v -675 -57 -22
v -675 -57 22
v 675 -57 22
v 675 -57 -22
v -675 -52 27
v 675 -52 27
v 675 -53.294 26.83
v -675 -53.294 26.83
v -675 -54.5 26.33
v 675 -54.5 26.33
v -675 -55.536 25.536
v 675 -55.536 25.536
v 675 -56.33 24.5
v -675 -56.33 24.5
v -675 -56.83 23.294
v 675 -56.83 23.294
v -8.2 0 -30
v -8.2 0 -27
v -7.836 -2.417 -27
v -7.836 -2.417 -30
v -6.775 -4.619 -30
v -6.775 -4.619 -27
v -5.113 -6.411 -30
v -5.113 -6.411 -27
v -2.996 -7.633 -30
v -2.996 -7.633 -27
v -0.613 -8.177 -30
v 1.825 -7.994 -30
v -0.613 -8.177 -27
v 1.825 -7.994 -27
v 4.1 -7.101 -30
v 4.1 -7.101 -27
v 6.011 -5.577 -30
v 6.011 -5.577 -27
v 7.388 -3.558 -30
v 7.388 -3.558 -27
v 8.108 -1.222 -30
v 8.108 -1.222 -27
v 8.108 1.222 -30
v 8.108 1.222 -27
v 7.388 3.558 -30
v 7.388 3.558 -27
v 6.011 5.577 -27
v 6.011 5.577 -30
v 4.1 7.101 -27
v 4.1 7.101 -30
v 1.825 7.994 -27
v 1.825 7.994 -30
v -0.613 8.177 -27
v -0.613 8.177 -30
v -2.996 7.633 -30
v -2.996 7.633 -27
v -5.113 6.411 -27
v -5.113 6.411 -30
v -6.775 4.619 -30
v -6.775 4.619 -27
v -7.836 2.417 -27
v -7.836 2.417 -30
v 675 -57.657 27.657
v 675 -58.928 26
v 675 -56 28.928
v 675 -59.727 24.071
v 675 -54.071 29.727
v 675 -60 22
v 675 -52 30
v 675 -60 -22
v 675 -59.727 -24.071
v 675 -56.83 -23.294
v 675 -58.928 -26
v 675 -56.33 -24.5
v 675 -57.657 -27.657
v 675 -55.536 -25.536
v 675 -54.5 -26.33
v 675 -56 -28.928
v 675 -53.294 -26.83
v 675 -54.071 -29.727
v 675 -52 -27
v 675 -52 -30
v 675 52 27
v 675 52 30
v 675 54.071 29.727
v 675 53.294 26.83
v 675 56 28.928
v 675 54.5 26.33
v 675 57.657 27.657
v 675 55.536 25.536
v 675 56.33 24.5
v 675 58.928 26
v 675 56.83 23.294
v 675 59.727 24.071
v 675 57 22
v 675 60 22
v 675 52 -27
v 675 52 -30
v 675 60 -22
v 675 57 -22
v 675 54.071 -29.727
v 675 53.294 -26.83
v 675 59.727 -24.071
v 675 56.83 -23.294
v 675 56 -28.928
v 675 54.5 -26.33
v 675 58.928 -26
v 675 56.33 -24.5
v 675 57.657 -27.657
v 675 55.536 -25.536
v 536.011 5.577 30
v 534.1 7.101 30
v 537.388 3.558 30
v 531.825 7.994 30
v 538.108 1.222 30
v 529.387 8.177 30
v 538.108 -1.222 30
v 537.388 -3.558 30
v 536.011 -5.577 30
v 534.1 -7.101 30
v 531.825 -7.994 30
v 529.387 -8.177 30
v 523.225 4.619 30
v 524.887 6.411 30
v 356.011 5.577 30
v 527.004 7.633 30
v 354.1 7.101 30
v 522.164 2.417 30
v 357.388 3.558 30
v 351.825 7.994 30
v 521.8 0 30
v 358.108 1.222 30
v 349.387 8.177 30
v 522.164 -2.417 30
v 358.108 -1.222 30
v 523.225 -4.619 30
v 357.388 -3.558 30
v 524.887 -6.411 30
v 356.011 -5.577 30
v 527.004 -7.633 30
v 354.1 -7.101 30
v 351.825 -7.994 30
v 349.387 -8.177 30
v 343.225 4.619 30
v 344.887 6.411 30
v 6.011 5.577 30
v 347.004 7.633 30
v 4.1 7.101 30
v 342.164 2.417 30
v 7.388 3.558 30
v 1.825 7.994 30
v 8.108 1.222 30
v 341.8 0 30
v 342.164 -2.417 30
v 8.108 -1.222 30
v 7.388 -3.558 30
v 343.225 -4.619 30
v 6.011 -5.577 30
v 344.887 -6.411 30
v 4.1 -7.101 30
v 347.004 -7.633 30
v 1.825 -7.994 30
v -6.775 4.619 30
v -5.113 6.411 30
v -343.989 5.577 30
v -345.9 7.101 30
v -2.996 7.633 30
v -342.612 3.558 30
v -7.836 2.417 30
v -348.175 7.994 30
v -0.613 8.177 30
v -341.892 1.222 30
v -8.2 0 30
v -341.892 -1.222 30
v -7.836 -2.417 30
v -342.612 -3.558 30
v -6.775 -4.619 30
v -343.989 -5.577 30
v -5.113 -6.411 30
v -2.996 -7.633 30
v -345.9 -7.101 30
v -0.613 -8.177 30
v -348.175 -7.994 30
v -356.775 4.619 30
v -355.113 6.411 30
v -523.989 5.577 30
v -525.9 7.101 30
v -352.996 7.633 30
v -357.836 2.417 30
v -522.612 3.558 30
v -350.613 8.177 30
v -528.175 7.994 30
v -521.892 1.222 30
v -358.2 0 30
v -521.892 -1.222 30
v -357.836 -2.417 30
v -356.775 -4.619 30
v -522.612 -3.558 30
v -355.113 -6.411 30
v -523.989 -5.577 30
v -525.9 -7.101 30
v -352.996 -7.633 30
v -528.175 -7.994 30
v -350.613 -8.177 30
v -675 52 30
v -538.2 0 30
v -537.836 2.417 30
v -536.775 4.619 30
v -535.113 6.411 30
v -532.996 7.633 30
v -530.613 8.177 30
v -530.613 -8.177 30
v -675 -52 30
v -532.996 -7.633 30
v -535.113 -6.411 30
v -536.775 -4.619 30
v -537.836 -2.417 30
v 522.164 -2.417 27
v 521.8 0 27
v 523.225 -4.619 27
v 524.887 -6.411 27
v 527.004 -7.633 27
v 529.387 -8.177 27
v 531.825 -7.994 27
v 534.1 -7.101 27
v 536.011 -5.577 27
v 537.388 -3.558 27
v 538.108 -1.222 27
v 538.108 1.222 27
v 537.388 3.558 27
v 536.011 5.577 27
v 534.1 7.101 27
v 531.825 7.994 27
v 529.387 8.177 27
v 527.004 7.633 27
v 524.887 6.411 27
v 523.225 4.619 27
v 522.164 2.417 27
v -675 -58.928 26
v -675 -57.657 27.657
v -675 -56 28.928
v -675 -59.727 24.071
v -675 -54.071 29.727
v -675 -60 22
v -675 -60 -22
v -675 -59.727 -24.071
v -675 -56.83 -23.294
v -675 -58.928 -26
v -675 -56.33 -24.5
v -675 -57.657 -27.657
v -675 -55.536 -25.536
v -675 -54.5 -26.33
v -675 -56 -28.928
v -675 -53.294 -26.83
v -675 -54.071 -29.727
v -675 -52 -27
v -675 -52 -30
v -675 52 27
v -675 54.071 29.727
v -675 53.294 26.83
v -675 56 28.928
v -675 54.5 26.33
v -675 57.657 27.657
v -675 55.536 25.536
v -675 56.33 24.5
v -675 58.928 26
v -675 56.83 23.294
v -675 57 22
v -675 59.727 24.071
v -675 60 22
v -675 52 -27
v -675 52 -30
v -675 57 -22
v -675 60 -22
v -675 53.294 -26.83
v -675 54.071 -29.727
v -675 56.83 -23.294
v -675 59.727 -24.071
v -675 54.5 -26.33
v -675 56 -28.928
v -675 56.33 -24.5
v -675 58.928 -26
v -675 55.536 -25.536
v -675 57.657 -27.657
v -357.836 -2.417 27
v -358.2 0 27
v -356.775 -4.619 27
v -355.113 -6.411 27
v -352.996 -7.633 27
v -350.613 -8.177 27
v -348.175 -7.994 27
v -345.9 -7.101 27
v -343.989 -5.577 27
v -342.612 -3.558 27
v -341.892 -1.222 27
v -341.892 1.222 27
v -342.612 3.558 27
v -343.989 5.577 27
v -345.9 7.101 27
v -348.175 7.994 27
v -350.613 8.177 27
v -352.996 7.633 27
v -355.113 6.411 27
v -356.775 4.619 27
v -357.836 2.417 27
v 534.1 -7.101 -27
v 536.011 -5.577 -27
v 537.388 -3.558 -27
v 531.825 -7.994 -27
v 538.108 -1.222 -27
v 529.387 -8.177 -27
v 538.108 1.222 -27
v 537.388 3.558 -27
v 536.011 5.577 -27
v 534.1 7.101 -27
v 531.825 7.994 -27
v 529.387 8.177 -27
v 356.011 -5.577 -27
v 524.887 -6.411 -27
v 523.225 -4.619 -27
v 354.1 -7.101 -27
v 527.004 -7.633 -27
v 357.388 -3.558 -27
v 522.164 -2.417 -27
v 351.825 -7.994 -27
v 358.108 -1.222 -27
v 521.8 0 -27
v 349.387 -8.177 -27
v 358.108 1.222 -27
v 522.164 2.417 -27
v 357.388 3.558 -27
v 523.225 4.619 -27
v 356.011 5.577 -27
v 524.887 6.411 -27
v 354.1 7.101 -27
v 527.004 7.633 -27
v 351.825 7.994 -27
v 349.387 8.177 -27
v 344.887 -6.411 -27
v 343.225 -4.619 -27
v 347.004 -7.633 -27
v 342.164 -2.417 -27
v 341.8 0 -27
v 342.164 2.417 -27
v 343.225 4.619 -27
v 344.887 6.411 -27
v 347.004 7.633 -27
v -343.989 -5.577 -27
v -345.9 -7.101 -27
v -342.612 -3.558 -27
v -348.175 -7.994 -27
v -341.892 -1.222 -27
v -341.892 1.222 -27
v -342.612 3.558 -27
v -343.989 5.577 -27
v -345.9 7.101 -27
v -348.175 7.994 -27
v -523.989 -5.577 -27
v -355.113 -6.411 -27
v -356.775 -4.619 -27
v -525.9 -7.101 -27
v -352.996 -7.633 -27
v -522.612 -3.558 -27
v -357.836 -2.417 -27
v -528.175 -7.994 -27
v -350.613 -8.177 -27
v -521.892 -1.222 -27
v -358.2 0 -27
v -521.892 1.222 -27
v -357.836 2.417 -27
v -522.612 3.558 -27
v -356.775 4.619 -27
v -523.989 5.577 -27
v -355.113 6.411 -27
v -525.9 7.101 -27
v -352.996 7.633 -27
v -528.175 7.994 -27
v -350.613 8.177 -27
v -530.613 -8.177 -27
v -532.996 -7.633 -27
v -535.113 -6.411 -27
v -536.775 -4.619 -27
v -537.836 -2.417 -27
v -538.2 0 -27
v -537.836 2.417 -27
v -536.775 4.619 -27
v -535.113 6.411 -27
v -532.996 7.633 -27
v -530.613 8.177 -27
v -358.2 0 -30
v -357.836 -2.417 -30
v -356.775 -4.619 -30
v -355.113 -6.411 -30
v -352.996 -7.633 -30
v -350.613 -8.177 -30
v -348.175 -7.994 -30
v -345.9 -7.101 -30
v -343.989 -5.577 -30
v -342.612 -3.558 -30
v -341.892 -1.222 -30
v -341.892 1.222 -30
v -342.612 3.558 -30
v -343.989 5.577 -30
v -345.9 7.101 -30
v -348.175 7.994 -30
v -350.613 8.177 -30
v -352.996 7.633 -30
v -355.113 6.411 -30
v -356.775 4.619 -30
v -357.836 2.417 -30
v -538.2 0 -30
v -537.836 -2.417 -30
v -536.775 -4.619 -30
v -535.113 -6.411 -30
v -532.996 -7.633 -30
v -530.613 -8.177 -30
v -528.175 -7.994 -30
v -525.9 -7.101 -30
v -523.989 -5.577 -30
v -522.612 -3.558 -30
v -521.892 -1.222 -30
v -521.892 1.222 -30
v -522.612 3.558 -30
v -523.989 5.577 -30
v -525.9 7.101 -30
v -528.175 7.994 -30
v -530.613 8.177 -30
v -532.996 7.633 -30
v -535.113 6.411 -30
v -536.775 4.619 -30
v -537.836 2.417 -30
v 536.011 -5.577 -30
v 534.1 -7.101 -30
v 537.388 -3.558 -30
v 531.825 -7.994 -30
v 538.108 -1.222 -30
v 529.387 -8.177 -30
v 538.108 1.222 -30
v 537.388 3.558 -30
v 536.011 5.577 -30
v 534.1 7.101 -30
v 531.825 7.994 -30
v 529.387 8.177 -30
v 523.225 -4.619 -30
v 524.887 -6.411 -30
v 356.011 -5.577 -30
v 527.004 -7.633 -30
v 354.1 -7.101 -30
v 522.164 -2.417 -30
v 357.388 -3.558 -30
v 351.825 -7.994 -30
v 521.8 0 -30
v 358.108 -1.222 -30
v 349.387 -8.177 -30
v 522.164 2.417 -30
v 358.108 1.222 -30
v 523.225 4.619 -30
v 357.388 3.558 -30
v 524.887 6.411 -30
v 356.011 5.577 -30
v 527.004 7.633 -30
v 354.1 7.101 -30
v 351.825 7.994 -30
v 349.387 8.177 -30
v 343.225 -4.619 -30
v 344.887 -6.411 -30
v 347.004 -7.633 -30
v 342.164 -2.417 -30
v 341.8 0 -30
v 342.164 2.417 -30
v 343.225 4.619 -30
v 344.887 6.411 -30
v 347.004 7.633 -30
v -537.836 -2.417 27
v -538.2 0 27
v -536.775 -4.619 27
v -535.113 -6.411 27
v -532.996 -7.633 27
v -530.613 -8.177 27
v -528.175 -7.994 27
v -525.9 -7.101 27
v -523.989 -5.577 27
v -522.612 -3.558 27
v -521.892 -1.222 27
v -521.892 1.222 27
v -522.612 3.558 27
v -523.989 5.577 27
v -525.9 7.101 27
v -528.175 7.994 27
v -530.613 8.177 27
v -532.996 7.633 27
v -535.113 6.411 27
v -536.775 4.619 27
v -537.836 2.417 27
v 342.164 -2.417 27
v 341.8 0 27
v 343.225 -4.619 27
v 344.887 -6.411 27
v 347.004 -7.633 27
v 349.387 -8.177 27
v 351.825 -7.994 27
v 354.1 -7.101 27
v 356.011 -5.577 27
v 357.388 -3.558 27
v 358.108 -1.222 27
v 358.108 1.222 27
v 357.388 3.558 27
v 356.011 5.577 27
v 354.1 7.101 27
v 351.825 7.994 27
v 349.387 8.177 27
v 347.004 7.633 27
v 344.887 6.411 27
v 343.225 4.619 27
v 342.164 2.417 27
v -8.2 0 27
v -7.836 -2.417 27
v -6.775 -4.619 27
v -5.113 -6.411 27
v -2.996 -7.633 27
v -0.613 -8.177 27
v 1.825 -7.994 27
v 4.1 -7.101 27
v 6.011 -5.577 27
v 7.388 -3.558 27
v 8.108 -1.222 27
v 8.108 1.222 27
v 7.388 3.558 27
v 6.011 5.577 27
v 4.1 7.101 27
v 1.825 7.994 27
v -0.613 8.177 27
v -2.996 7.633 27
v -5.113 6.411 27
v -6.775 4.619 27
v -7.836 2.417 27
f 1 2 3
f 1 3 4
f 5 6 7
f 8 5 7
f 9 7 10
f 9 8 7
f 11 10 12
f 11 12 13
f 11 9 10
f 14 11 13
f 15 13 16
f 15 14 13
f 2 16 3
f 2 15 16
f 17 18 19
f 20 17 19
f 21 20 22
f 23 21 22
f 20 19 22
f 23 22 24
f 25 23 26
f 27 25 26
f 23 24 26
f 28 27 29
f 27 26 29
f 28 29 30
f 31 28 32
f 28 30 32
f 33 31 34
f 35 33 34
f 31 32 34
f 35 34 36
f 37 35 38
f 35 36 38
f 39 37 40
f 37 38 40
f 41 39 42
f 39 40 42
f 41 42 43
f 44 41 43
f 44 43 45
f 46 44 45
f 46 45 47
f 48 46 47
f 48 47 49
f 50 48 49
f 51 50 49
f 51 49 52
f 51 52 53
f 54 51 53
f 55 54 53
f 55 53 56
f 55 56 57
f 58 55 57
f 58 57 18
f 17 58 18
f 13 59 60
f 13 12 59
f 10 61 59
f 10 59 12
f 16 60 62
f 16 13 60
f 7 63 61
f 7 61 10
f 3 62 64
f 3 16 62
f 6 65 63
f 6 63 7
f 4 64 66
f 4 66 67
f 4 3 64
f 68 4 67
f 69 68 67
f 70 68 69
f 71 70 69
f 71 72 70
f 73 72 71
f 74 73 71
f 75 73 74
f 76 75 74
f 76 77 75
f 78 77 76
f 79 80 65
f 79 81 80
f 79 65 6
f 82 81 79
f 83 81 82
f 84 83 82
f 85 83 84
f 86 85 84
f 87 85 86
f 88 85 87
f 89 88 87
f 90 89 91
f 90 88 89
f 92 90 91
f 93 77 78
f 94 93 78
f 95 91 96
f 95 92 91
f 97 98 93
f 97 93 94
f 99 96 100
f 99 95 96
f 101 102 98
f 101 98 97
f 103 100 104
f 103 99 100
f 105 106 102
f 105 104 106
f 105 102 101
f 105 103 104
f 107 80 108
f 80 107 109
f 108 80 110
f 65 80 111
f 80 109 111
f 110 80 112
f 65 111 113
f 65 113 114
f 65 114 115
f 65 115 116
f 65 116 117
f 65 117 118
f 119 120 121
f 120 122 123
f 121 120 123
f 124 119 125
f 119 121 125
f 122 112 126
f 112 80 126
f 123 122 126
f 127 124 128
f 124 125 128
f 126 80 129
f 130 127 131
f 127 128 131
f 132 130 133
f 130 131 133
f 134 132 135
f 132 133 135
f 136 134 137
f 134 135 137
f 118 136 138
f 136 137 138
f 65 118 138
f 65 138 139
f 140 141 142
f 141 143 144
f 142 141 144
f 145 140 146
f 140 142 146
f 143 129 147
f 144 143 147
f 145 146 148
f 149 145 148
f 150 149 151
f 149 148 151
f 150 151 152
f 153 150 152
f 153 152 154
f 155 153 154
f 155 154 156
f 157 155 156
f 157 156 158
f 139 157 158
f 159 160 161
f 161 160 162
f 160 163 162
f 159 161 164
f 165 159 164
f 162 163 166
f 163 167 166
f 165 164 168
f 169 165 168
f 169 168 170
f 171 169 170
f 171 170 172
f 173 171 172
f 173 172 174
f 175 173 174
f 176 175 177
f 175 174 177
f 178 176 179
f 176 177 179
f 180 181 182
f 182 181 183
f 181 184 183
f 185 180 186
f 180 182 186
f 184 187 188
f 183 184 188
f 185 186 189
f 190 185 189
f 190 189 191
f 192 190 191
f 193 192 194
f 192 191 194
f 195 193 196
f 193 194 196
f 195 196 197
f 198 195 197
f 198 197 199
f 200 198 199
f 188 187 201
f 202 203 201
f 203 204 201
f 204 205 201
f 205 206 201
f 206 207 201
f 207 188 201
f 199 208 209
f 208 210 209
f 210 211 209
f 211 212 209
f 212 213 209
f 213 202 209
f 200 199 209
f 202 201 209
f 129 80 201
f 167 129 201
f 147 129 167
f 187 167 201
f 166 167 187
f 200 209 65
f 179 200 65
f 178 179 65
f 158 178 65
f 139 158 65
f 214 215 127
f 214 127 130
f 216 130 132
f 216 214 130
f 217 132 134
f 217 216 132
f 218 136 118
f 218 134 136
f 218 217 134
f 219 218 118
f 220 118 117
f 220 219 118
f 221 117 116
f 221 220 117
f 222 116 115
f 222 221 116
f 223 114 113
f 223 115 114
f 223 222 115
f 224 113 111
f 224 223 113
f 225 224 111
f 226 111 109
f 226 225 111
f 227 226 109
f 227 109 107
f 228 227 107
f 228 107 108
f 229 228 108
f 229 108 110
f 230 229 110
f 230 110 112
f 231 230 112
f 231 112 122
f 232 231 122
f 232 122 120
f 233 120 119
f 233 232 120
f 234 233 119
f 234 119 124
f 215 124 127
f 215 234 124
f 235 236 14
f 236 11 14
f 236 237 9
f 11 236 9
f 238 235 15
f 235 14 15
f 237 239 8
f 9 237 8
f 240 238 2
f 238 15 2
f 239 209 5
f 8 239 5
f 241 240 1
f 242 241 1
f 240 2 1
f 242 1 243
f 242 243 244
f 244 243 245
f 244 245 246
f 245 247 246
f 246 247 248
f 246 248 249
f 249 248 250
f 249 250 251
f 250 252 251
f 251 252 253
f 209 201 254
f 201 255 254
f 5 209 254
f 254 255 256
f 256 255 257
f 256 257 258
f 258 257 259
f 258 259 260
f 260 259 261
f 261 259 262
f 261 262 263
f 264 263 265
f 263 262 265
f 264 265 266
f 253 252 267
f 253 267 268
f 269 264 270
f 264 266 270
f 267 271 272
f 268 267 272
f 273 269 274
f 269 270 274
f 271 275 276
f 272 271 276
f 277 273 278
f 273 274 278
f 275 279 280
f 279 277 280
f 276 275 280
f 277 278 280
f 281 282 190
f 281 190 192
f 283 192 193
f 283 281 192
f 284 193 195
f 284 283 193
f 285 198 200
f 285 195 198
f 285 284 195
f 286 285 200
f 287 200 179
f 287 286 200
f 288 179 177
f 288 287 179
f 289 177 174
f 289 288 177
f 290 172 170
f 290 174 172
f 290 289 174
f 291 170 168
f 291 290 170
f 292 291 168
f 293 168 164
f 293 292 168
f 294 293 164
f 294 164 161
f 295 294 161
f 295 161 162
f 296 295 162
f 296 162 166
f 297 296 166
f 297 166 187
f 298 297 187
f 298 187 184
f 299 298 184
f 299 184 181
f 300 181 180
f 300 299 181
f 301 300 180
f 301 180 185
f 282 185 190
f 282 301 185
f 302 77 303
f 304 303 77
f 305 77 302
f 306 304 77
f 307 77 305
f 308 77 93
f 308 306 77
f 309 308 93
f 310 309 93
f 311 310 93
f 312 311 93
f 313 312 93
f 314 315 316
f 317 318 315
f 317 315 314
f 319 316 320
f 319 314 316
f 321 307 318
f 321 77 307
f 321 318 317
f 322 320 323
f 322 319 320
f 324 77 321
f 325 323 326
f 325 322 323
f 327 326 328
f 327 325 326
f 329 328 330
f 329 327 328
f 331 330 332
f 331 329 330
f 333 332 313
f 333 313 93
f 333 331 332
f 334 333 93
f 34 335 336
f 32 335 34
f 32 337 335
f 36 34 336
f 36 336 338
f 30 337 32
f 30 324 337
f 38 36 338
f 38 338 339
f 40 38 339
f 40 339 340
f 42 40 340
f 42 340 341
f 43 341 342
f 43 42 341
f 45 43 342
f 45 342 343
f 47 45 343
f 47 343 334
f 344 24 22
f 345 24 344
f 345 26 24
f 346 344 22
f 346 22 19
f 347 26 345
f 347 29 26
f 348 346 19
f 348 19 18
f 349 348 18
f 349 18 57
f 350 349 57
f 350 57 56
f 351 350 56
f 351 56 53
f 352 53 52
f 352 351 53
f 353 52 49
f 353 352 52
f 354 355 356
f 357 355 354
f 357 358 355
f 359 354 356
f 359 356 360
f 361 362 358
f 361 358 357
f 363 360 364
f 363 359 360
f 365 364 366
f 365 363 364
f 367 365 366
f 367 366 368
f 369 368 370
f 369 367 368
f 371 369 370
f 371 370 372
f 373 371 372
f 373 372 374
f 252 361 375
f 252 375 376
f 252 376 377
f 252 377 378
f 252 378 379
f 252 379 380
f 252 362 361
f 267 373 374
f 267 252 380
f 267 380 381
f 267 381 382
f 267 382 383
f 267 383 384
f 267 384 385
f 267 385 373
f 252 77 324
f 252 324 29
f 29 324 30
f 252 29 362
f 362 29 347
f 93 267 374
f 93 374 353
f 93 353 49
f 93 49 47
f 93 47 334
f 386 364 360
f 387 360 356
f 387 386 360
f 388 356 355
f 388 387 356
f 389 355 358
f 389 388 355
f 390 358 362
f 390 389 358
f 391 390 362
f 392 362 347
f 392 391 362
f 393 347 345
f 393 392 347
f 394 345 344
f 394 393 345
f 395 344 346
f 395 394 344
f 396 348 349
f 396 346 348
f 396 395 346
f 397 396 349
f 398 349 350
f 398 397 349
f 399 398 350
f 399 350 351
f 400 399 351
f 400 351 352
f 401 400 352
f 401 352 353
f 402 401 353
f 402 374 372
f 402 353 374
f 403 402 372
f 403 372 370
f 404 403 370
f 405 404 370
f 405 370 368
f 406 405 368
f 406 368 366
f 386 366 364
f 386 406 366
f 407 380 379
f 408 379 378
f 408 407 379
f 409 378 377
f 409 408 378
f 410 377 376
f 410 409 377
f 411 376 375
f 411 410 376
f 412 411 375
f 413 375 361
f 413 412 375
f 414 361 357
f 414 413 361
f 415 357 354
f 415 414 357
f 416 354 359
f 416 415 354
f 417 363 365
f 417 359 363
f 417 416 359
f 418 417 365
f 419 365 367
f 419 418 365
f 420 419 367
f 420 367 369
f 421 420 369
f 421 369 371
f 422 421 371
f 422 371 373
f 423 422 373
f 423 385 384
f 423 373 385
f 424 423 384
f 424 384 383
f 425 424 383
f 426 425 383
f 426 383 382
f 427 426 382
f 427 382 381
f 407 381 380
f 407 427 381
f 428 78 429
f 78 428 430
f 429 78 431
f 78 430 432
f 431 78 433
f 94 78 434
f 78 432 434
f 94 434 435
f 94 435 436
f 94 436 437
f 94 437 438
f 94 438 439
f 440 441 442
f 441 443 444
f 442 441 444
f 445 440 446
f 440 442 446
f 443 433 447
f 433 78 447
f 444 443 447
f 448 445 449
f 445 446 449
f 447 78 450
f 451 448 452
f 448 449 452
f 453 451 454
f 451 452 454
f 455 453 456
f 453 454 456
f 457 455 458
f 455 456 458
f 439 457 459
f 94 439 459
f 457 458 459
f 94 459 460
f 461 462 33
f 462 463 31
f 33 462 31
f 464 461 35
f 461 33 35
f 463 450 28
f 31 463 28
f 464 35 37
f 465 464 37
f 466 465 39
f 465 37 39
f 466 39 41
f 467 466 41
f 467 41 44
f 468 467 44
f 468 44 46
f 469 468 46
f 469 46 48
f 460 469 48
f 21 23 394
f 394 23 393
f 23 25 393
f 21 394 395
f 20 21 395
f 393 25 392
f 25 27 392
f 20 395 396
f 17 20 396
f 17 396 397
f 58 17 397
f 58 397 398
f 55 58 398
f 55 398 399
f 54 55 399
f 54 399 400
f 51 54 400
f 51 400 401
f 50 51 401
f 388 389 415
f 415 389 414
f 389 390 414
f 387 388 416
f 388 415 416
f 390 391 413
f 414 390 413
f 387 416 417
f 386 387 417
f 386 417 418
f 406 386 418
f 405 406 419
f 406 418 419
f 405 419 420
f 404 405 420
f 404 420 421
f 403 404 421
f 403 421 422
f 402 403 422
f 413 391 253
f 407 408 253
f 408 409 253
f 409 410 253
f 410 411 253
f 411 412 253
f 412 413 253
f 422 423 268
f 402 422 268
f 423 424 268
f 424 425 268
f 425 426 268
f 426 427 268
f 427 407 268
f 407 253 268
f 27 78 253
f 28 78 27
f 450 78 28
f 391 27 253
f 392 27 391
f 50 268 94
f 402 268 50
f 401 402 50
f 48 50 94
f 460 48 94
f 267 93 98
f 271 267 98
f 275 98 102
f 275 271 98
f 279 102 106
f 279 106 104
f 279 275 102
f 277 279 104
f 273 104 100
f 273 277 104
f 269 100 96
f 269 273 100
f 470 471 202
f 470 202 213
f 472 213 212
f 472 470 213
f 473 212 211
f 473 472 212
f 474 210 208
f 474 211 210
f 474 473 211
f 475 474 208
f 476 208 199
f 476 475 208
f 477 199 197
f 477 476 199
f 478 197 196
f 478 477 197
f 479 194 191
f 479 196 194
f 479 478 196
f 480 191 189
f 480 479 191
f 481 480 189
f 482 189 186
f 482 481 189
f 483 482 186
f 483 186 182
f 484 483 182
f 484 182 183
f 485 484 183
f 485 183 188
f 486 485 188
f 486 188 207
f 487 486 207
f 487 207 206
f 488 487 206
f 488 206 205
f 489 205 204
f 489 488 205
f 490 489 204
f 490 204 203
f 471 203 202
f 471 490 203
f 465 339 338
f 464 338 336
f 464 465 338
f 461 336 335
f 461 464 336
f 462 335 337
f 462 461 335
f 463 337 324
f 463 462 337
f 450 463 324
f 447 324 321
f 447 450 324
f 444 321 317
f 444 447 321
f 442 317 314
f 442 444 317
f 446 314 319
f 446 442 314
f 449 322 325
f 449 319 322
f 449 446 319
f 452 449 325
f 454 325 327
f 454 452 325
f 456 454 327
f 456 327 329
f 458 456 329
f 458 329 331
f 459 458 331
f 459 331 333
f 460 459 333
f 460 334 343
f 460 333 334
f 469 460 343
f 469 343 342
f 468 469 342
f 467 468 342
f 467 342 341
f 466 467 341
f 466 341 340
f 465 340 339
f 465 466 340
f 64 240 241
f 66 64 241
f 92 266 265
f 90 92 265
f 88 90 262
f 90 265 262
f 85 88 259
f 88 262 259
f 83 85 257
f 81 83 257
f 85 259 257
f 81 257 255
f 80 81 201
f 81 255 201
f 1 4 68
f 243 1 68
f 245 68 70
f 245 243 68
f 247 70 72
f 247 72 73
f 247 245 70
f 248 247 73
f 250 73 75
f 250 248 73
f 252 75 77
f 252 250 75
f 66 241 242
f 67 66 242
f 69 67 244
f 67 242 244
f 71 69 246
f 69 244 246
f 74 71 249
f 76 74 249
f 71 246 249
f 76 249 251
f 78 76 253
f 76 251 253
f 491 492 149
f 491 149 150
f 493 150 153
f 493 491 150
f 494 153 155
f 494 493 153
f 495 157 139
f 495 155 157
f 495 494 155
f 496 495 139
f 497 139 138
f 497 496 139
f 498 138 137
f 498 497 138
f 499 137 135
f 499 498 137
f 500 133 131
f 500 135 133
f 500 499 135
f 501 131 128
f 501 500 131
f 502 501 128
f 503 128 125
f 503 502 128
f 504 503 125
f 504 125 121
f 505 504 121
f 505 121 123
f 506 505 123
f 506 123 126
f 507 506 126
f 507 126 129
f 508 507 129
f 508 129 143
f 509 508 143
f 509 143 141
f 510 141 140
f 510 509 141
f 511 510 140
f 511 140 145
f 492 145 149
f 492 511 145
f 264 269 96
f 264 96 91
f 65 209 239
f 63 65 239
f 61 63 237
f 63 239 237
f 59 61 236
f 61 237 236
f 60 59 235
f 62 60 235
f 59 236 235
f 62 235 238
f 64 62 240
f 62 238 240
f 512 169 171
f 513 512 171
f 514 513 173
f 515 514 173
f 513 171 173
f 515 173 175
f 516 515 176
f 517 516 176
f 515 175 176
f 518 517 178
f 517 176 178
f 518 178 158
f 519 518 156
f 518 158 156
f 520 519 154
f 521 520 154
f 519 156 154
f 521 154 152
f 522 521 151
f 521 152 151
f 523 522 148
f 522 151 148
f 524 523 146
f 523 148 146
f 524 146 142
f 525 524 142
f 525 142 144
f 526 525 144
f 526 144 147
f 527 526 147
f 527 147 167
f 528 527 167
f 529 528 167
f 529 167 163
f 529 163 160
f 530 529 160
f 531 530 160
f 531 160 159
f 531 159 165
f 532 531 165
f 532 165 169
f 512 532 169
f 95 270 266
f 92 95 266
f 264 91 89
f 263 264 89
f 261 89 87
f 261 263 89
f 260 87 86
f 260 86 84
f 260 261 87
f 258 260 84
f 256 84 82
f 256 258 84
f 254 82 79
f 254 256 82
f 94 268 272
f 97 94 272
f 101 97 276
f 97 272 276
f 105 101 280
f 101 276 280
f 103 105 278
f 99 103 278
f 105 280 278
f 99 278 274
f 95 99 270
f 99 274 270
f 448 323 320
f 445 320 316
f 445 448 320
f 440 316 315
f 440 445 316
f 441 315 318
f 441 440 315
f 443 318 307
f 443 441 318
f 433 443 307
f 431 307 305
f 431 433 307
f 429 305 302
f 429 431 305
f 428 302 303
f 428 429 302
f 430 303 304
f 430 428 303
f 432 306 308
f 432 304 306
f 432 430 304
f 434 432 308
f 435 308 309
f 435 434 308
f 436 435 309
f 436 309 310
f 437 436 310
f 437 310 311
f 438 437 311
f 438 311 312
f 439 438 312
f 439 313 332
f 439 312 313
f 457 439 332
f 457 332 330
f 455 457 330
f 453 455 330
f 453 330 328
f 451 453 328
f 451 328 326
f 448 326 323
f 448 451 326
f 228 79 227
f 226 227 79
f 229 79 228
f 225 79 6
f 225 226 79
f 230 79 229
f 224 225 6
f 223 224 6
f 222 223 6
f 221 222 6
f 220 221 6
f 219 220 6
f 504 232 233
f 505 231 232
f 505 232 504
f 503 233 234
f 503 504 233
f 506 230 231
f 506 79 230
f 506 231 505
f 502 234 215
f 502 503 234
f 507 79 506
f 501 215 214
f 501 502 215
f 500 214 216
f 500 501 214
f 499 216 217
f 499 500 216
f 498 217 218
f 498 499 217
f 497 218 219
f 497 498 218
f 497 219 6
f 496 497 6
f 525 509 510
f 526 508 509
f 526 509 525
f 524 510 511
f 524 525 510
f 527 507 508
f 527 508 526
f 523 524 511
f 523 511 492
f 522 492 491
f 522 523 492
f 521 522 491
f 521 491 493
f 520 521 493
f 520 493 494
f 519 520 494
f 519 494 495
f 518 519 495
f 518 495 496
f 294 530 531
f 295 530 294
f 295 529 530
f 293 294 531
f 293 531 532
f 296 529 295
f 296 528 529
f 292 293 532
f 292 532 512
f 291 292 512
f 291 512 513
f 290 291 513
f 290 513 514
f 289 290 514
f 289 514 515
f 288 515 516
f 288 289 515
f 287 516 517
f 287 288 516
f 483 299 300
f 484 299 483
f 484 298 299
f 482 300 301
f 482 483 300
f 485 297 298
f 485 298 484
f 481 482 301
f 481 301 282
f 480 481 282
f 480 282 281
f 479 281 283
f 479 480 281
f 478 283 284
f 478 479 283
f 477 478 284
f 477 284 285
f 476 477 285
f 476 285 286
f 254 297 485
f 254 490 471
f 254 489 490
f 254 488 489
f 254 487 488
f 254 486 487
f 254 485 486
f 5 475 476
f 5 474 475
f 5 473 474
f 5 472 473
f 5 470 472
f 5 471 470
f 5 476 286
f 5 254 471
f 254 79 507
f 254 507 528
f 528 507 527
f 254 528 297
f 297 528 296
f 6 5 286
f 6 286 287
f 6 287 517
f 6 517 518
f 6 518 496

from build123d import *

# Parameters (mm, degrees)
EXTRUDE_THIN1_DEPTH      = 675
EXTRUDE_THIN1_DEPTH_BACK = 675
SKETCH4_R                = 8.2
CUT_EXTRUDE3_DEPTH       = 110
SKETCH5_R                = 8.2
CUT_EXTRUDE4_DEPTH       = 110


with BuildPart() as part:
    # Sketch1 → Extrude-Thin1 (new, two sides: drawn at the far end of the back side and taken through both)
    with BuildSketch(Plane(origin=(0, 0, 0), x_dir=(0, 0, -1), z_dir=(1, 0, 0)).offset(-EXTRUDE_THIN1_DEPTH_BACK)):
        with BuildLine():
            Line((-30, 52), (-30, -52))
            ThreePointArc((-30, -52), (-27.656854249, -57.656854249), (-22, -60))
            Line((-22, -60), (22, -60))
            ThreePointArc((22, -60), (27.656854249, -57.656854249), (30, -52))
            Line((30, -52), (30, 52))
            ThreePointArc((30, 52), (27.656854249, 57.656854249), (22, 60))
            Line((22, 60), (-22, 60))
            ThreePointArc((-22, 60), (-27.656854249, 57.656854249), (-30, 52))
        make_face()
        with BuildLine():
            Line((-27, 52), (-27, -52))
            ThreePointArc((-27, -52), (-25.535533906, -55.535533906), (-22, -57))
            Line((-22, -57), (22, -57))
            ThreePointArc((22, -57), (25.535533906, -55.535533906), (27, -52))
            Line((27, -52), (27, 52))
            ThreePointArc((27, 52), (25.535533906, 55.535533906), (22, 57))
            Line((22, 57), (-22, 57))
            ThreePointArc((-22, 57), (-25.535533906, 55.535533906), (-27, 52))
        make_face(mode=Mode.SUBTRACT)
    extrude(amount=EXTRUDE_THIN1_DEPTH + EXTRUDE_THIN1_DEPTH_BACK)

    # Sketch4 → Cut-Extrude3 (cut)
    with BuildSketch(Plane.XY.offset(30)):
        with Locations(Location((0, 0, 0), (0, 0, 180))):
            Circle(SKETCH4_R)
    extrude(amount=-CUT_EXTRUDE3_DEPTH, mode=Mode.SUBTRACT)

    # Sketch5 → Cut-Extrude4 (cut)
    with BuildSketch(Plane(origin=(0, -1598, -30), x_dir=(1, 0, 0), z_dir=(0, 0, 1))):
        with Locations(Location((350, 1598, 0), (0, 0, 180))):
            Circle(SKETCH5_R)
        with Locations(Location((530, 1598, 0), (0, 0, 180))):
            Circle(SKETCH5_R)
        with Locations(Location((-350, 1598, 0), (0, 0, 180))):
            Circle(SKETCH5_R)
        with Locations(Location((-530, 1598, 0), (0, 0, 180))):
            Circle(SKETCH5_R)
    extrude(amount=CUT_EXTRUDE4_DEPTH, mode=Mode.SUBTRACT)


solid = part.part
